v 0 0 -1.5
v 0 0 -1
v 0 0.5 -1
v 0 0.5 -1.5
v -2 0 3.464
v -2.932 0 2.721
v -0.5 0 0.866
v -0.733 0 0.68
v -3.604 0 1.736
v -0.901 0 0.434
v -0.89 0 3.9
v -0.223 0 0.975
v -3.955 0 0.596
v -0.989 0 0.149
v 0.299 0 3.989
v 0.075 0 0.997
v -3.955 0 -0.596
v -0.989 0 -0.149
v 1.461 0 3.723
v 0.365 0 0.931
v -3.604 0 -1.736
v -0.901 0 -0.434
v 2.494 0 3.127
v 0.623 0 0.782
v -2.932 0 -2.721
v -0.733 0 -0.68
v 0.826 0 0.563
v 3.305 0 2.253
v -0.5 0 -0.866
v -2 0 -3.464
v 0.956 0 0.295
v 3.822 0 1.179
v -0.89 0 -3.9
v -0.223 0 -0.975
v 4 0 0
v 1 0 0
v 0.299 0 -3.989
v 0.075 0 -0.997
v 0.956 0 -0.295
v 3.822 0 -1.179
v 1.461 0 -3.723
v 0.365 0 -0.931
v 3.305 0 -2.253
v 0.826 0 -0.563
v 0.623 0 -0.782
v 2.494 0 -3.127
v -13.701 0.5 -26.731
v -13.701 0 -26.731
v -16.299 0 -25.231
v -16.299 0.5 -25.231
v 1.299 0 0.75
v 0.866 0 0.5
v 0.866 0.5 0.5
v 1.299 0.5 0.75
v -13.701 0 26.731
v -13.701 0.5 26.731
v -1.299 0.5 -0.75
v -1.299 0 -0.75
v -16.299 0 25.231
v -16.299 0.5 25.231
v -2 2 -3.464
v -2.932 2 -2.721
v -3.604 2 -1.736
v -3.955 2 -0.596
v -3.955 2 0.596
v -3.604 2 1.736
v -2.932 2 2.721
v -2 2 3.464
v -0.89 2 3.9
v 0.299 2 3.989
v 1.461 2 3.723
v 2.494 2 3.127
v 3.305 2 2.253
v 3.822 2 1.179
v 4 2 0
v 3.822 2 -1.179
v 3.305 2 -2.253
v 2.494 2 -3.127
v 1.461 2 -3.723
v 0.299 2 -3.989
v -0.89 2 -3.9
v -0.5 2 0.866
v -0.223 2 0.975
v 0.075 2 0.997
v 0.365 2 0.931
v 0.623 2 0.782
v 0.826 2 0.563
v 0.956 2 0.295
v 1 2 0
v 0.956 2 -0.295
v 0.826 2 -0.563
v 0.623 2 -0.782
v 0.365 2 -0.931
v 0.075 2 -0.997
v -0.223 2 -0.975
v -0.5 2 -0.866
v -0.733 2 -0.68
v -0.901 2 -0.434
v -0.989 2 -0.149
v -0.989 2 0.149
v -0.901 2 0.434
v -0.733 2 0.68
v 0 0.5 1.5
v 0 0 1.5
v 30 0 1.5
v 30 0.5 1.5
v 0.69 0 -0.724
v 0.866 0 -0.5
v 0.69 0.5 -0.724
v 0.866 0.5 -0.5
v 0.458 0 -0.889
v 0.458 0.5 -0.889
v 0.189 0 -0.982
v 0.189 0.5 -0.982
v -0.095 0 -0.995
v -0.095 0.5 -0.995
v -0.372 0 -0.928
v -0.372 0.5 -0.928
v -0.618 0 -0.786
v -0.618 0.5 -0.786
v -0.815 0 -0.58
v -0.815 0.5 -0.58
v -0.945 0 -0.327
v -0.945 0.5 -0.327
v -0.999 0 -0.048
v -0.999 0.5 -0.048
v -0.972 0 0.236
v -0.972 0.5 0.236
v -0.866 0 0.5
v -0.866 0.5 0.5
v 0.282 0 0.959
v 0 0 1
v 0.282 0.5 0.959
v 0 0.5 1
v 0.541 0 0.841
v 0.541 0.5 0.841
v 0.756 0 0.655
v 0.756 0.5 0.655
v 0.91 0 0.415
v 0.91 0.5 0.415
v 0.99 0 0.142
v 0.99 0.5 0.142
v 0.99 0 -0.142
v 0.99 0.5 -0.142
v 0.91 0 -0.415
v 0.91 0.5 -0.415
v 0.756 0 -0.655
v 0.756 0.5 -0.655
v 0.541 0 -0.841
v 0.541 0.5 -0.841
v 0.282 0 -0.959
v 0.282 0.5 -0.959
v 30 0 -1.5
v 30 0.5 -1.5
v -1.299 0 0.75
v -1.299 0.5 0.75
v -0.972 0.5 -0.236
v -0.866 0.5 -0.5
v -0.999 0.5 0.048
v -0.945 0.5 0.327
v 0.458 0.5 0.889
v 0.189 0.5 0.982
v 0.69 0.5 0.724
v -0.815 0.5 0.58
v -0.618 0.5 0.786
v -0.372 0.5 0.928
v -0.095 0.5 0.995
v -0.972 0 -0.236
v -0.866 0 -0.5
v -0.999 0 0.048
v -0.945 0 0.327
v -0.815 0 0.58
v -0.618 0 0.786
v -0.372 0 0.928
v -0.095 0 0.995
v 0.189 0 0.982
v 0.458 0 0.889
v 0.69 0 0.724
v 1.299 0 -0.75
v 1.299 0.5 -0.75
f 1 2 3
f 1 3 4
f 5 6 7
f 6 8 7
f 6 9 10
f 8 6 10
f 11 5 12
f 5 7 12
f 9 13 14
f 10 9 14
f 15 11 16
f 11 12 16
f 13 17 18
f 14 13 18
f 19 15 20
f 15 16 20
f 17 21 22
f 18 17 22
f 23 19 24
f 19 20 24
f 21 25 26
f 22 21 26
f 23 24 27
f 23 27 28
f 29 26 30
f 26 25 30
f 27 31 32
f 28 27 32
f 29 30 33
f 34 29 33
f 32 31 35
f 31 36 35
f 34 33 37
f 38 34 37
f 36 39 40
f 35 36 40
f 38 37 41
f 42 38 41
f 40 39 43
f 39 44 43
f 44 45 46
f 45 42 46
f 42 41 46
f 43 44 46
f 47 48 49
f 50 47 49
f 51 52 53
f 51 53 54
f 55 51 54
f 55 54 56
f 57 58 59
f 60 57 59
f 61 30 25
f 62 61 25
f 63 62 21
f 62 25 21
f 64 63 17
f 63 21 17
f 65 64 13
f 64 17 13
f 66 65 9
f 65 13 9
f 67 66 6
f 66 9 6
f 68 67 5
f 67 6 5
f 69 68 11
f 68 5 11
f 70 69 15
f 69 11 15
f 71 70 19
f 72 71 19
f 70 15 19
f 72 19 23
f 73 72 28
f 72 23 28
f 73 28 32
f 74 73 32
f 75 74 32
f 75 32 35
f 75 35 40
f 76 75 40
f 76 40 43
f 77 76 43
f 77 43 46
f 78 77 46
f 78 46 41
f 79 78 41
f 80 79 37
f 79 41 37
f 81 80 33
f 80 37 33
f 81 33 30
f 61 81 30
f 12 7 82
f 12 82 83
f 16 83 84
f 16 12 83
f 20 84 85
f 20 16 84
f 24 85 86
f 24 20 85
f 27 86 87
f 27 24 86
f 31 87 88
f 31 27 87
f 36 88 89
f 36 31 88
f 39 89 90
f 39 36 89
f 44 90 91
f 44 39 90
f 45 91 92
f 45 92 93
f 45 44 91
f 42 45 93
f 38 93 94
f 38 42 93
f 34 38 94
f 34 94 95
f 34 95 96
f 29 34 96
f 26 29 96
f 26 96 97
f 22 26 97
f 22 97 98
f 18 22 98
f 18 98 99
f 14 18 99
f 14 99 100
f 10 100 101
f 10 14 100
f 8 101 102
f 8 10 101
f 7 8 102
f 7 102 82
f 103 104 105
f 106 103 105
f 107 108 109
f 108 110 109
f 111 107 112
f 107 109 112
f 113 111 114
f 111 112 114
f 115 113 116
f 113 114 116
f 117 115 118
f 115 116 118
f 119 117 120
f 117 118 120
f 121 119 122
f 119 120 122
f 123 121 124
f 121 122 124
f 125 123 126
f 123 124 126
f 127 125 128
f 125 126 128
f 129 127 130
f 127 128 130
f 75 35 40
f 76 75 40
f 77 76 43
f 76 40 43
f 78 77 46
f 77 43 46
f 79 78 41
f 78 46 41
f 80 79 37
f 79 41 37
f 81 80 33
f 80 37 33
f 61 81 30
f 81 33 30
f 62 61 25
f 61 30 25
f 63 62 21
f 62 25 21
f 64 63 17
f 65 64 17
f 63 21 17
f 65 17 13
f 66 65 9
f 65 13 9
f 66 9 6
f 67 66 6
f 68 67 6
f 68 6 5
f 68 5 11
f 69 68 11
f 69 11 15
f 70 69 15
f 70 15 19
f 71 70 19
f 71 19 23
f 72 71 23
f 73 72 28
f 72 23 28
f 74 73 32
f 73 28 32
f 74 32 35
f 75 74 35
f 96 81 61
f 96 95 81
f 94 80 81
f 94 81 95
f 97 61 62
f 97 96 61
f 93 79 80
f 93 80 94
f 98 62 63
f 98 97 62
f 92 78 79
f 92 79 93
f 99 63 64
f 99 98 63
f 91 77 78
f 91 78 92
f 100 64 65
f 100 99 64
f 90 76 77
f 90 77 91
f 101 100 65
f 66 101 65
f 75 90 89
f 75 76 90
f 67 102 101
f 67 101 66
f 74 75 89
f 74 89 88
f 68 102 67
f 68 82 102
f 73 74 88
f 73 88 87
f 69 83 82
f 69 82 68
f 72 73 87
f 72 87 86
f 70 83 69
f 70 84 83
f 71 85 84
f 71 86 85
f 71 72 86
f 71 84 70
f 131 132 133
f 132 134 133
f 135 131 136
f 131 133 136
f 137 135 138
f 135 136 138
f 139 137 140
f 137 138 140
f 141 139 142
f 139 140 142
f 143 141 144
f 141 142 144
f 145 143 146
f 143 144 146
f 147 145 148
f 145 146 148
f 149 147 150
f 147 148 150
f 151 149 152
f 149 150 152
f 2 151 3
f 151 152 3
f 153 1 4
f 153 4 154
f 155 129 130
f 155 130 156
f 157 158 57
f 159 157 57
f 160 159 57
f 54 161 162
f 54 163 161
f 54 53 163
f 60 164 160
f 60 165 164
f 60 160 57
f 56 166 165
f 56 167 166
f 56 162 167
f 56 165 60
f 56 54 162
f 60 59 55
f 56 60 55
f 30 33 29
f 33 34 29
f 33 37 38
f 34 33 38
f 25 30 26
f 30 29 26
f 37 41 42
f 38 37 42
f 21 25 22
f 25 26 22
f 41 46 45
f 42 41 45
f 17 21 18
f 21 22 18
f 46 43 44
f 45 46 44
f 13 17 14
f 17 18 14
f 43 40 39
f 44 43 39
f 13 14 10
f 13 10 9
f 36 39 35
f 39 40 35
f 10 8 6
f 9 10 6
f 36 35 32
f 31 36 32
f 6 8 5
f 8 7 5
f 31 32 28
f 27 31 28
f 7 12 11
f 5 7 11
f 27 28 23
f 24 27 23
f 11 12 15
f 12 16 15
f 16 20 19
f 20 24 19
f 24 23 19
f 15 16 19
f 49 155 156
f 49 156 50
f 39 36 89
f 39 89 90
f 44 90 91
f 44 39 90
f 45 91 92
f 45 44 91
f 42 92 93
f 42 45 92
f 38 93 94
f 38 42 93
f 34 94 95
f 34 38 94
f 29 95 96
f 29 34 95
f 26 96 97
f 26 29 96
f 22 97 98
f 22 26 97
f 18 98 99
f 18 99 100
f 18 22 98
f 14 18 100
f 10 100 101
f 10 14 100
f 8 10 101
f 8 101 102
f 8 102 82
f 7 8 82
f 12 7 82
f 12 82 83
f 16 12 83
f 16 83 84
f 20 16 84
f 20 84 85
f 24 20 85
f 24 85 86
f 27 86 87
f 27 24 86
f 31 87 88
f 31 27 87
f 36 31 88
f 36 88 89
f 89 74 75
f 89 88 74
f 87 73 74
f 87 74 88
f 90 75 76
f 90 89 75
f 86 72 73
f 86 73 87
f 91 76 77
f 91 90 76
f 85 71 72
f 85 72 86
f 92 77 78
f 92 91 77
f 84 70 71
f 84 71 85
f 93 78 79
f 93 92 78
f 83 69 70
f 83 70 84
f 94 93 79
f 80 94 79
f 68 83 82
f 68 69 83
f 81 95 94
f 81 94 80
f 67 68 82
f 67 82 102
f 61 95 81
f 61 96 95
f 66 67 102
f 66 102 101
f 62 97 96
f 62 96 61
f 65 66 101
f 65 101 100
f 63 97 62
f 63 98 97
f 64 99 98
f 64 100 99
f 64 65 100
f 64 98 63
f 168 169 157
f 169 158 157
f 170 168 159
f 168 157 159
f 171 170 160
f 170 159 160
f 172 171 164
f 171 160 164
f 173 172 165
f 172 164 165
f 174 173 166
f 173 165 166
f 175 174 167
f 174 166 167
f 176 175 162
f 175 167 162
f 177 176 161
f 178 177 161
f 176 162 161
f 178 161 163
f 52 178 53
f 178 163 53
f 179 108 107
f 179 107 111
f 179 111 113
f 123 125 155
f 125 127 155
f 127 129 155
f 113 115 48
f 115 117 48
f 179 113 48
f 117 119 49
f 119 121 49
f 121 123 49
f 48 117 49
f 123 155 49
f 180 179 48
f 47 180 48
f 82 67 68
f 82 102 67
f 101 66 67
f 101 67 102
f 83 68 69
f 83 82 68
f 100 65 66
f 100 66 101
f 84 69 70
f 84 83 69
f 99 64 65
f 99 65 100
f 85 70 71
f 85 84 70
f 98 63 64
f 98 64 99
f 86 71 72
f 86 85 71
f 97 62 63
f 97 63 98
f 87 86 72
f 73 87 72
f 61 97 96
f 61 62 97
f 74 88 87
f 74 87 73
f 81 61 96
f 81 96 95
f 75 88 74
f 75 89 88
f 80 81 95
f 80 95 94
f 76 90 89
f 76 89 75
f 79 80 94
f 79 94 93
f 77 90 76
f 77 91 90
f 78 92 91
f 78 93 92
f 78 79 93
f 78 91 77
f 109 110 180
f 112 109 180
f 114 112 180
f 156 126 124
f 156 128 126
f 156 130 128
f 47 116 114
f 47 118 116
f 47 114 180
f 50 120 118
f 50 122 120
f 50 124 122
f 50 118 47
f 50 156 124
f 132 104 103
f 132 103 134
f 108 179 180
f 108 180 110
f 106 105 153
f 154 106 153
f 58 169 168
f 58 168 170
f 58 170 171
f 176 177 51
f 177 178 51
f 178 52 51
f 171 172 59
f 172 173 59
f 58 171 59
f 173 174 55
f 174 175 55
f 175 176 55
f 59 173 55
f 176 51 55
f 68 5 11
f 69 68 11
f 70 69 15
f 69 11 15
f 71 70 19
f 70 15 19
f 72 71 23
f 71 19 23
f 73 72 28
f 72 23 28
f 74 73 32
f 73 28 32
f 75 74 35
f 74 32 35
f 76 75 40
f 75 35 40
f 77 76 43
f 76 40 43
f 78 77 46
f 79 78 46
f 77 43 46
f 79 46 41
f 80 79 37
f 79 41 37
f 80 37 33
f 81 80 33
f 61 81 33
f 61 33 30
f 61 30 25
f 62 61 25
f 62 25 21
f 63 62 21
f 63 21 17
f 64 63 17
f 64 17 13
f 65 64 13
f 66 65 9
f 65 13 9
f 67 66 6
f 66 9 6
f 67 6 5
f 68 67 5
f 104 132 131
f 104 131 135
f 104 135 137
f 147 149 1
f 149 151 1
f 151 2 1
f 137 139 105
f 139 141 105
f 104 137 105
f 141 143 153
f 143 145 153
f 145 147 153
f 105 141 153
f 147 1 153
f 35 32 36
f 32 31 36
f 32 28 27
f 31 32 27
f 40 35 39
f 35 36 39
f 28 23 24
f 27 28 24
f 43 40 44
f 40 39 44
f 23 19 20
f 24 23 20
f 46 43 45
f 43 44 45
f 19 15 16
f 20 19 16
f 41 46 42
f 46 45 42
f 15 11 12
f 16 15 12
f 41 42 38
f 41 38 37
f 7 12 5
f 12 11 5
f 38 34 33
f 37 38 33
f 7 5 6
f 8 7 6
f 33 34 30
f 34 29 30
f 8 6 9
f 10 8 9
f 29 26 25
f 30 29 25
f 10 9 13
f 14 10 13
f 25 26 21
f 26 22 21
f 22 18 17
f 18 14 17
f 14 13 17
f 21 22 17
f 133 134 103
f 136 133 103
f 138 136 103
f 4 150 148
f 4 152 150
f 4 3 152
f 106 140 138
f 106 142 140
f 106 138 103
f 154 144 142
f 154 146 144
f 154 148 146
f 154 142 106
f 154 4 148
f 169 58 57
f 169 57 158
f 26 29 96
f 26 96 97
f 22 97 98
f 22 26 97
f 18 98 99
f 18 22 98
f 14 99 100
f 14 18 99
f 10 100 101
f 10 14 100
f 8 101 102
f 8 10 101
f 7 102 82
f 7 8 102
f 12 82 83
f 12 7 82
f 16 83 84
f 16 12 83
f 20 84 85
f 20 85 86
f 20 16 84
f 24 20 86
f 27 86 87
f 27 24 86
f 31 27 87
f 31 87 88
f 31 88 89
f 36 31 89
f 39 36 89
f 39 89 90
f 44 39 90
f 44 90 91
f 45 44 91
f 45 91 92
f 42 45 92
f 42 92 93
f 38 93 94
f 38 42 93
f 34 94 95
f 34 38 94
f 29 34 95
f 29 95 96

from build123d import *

# Parameters (mm, degrees)
SKETCH1_R           = 4
SKETCH1_R_2         = 1
BOSS_EXTRUDE1_DEPTH = 2
CIRPATTERN2_COUNT   = 3
BOSS_EXTRUDE5_START = -2
SKETCH5_W           = 30
SKETCH5_H           = 3
BOSS_EXTRUDE5_DEPTH = 0.5
CIRPATTERN4_COUNT   = 3
SKETCH6_R           = 1
CUT_EXTRUDE1_DEPTH  = 10


with BuildPart() as part:
    # Sketch1 → Boss-Extrude1 (new body)
    with BuildSketch(Plane(origin=(0, 0, 0), x_dir=(1, 0, 0), z_dir=(0, 1, 0))):
        Circle(SKETCH1_R)
        Circle(SKETCH1_R_2, mode=Mode.SUBTRACT)
    extrude(amount=BOSS_EXTRUDE1_DEPTH)


with BuildPart() as cirpattern2_1:
    # CirPattern2: pattern copy
    add(part.part.rotate(Axis((0, 2, 0), (0, 1, 0)), 1 * 360 / CIRPATTERN2_COUNT))


with BuildPart() as cirpattern2_2:
    # CirPattern2: pattern copy
    add(part.part.rotate(Axis((0, 2, 0), (0, 1, 0)), 2 * 360 / CIRPATTERN2_COUNT))


with BuildPart() as body_4:
    # Sketch5 → Boss-Extrude5 (new body)
    with BuildSketch(Plane(origin=(0, 2, 0), x_dir=(1, 0, 0), z_dir=(0, 1, 0)).offset(BOSS_EXTRUDE5_START)):
        with Locations((15, 0)):
            Rectangle(SKETCH5_W, SKETCH5_H)
    extrude(amount=BOSS_EXTRUDE5_DEPTH)


with BuildPart() as cirpattern4_1:
    # CirPattern4: pattern copy
    add(body_4.part.rotate(Axis((0, 0, 0), (0, 1, 0)), 1 * 360 / CIRPATTERN4_COUNT))


with BuildPart() as cirpattern4_2:
    # CirPattern4: pattern copy
    add(body_4.part.rotate(Axis((0, 0, 0), (0, 1, 0)), 2 * 360 / CIRPATTERN4_COUNT))


with BuildPart() as cut_extrude1_tool:
    # Sketch6 → Cut-Extrude1 (new body)
    with BuildSketch(Plane(origin=(0, 2, 0), x_dir=(1, 0, 0), z_dir=(0, 1, 0))):
        Circle(SKETCH6_R)
    extrude(amount=-CUT_EXTRUDE1_DEPTH)


with BuildPart() as body_4_1:
    add(body_4.part)

    # Cut-Extrude1: cut by cut_extrude1_tool
    add(cut_extrude1_tool.part, mode=Mode.SUBTRACT)


with BuildPart() as cirpattern4_1_1:
    add(cirpattern4_1.part)

    # Cut-Extrude1: cut by cut_extrude1_tool
    add(cut_extrude1_tool.part, mode=Mode.SUBTRACT)


with BuildPart() as cirpattern4_2_1:
    add(cirpattern4_2.part)

    # Cut-Extrude1: cut by cut_extrude1_tool
    add(cut_extrude1_tool.part, mode=Mode.SUBTRACT)


solid = Compound([part.part, cirpattern2_1.part, cirpattern2_2.part, body_4_1.part, cirpattern4_1_1.part, cirpattern4_2_1.part])
